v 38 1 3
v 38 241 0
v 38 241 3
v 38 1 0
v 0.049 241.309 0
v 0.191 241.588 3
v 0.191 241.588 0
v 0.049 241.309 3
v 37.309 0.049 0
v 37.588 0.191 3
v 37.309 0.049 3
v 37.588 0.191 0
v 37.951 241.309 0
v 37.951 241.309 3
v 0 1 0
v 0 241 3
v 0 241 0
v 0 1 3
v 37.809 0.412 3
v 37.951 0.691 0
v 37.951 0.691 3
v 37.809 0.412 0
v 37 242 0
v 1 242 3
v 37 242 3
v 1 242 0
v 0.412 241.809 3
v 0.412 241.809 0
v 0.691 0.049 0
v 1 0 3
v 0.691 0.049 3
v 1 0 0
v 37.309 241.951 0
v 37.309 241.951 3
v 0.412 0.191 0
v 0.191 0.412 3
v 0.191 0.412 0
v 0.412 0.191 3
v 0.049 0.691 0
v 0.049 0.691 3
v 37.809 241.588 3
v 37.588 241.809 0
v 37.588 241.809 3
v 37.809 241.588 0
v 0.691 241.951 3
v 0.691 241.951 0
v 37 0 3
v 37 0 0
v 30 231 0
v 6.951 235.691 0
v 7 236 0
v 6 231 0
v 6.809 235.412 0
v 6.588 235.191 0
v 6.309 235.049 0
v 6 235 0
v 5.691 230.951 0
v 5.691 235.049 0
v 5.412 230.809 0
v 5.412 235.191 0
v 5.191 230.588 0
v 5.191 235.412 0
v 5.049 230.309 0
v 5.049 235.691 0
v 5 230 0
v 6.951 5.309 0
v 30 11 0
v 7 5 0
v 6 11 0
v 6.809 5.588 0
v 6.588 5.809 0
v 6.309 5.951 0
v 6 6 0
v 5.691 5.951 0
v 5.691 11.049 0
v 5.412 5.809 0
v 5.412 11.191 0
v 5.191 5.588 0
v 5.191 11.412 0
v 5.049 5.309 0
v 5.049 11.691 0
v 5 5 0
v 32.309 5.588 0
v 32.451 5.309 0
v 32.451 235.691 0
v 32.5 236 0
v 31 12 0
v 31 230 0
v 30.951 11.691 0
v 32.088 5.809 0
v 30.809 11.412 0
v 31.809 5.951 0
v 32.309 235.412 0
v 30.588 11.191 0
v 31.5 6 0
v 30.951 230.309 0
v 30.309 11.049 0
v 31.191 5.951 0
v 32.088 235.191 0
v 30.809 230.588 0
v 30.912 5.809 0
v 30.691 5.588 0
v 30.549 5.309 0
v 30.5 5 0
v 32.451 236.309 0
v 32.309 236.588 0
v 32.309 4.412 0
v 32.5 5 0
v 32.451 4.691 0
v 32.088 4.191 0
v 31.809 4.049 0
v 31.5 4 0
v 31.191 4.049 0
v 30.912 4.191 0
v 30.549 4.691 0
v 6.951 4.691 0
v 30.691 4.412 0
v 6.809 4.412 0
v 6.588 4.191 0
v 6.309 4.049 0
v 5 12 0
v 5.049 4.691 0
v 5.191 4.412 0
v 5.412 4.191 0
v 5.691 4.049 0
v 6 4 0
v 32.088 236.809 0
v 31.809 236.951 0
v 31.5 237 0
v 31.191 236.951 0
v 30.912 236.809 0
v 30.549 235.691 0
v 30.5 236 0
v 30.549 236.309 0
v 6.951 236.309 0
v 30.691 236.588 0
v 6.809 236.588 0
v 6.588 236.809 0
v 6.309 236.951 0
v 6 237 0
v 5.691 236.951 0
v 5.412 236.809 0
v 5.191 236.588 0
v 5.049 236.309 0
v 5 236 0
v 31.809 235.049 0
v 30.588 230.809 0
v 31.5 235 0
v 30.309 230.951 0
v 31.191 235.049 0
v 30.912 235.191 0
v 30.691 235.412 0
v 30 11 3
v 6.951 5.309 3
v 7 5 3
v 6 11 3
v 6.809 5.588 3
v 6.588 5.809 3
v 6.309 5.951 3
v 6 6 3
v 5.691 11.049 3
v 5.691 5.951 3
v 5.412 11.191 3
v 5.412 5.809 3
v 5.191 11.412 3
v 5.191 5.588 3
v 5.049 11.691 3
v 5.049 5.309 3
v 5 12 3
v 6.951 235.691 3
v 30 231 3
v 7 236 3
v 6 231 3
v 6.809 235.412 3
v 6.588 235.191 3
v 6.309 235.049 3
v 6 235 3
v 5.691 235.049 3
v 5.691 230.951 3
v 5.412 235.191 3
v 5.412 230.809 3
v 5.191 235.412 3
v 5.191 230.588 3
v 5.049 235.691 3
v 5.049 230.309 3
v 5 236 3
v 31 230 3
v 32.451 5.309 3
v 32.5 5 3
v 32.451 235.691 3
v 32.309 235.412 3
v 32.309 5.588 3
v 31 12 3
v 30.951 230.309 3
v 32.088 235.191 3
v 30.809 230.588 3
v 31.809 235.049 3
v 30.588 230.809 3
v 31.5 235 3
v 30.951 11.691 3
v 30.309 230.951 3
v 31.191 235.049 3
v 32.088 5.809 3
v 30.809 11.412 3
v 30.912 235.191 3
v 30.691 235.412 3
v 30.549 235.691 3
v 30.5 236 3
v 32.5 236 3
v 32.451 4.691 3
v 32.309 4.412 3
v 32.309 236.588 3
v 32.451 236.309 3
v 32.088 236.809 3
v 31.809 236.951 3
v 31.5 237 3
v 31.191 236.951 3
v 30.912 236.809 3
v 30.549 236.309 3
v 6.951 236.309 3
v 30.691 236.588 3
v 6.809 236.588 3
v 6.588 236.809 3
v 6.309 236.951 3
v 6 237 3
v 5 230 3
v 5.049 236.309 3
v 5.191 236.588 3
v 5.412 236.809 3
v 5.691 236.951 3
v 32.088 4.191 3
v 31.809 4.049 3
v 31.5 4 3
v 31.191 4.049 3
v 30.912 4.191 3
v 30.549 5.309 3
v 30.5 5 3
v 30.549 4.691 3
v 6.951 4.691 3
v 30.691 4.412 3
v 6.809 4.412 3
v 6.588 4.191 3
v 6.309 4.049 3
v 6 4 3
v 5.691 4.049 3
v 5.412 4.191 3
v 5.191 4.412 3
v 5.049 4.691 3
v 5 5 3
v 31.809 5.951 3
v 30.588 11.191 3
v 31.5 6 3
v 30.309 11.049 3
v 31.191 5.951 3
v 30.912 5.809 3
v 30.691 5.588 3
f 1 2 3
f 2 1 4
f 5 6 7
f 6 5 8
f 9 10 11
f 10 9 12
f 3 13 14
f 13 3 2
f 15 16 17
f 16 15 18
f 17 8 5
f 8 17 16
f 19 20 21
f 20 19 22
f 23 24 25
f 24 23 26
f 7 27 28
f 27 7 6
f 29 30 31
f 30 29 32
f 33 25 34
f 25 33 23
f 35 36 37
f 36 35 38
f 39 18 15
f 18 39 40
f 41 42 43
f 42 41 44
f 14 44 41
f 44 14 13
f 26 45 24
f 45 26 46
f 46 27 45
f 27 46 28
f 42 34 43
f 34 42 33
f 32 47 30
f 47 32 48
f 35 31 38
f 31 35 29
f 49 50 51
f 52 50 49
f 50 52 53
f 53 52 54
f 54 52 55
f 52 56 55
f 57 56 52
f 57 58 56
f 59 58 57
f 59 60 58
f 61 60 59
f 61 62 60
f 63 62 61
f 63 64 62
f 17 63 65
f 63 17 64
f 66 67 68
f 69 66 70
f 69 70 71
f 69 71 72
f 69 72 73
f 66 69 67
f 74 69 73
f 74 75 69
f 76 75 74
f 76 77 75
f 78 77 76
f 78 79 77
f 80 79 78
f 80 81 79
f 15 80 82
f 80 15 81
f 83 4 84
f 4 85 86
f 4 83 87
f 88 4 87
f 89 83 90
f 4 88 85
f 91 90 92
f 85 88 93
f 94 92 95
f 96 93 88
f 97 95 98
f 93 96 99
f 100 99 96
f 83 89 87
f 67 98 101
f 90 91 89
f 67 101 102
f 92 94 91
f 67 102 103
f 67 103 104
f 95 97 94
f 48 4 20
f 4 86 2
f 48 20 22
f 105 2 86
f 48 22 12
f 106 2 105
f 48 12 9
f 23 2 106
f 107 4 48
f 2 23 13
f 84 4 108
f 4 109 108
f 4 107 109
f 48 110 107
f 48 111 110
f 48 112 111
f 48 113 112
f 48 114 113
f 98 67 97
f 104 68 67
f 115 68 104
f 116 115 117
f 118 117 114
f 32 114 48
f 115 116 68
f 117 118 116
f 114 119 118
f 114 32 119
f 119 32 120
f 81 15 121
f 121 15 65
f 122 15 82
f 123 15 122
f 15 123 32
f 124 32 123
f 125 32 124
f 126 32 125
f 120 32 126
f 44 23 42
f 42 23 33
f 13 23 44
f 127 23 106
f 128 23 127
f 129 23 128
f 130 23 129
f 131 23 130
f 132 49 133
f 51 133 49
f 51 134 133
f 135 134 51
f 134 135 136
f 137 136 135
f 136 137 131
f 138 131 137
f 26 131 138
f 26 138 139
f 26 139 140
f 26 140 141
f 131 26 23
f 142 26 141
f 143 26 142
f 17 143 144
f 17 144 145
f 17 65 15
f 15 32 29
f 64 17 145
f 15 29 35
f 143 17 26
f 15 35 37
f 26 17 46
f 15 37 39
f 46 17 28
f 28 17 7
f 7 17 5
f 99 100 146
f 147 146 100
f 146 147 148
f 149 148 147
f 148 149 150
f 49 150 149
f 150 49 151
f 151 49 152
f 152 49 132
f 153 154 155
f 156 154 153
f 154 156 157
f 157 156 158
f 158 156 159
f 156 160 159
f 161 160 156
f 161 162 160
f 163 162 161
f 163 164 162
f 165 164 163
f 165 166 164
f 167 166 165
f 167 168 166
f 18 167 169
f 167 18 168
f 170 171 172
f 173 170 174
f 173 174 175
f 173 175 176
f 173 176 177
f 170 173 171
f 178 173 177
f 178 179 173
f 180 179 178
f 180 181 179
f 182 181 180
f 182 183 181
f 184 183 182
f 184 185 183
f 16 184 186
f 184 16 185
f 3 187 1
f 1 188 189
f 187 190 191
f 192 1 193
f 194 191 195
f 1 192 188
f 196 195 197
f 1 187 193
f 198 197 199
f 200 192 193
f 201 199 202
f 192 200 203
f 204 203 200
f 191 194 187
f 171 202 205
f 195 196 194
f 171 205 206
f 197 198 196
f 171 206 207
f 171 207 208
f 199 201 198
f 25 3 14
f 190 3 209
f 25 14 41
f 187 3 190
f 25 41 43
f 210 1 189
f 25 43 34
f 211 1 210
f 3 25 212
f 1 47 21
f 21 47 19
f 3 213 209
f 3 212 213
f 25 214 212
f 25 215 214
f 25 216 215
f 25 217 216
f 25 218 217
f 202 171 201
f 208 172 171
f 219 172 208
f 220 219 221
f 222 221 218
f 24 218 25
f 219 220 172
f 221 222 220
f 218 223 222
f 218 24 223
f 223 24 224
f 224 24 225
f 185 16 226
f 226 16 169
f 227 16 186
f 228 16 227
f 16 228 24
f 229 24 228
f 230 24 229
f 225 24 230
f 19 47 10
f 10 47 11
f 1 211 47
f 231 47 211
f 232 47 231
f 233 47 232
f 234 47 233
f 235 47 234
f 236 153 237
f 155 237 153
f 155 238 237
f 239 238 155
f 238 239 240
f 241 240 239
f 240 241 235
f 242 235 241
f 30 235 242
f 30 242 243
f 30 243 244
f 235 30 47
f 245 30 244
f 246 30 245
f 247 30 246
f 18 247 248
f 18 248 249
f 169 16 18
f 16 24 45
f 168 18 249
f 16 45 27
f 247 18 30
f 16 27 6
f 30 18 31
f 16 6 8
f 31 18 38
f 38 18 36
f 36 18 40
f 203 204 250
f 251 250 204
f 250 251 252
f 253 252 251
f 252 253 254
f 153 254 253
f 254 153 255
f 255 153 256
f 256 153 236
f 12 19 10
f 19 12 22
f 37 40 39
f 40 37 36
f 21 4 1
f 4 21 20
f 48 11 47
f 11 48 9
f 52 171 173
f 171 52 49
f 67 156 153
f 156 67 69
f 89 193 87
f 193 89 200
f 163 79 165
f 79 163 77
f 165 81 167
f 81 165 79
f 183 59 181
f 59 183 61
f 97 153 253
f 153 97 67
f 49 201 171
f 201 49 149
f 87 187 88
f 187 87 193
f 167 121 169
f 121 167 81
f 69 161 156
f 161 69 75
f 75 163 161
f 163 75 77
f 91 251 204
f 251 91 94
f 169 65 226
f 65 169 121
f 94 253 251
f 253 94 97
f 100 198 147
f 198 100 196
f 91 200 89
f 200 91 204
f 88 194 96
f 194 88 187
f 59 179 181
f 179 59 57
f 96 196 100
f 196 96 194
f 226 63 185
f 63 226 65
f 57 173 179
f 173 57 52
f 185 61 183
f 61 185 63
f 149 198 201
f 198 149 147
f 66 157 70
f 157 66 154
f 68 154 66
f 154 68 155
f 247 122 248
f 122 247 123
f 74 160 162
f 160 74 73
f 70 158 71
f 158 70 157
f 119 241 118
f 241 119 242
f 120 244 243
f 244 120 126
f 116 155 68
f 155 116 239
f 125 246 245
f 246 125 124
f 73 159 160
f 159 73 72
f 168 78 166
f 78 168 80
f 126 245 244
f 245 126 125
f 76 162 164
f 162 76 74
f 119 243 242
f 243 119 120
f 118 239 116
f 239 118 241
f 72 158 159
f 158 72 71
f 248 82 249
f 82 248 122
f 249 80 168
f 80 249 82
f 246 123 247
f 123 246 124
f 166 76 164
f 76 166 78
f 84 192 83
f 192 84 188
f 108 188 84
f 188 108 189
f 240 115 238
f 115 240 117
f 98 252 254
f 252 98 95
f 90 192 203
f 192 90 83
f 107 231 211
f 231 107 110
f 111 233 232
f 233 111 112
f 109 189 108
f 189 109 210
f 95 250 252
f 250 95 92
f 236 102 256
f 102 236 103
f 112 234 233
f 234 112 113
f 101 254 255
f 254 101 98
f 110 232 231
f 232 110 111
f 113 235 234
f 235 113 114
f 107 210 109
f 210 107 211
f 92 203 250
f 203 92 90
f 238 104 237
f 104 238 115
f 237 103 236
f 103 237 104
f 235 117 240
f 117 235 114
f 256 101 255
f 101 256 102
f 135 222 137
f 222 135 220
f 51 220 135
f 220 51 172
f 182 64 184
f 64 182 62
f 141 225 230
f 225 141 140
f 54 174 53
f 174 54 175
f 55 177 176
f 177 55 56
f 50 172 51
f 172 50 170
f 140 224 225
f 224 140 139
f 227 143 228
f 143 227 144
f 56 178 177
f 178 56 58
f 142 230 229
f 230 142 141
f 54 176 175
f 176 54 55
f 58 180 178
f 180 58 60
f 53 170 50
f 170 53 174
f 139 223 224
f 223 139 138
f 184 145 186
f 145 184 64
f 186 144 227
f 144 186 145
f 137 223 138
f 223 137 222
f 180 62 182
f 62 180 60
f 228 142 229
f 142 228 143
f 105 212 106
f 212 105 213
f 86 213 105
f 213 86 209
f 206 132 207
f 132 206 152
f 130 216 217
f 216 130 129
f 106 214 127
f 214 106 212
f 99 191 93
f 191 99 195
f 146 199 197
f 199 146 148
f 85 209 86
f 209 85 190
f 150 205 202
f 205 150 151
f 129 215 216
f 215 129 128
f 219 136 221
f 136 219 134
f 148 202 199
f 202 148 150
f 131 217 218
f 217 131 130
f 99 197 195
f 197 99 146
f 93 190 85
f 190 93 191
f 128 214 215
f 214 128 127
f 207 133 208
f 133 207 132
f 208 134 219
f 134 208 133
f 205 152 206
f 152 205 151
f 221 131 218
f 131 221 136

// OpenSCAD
$fn = 20;
len = 242;
wid = 33;

spacing = 46.5;
boltDia = 3.2;

endcap(rad=1);

module endcap(rad=1) {
   difference() {
      union() {
         hull() {
            translate([1,1,0]) cylinder(r=1,h=3);
            translate([wid+5-1,1,0]) cylinder(r=1,h=3);
            translate([1,len-1,0]) cylinder(r=1,h=3);
            translate([wid+5-1,len-1,0]) cylinder(r=1,h=3);
         }
      }

      /* wire passthrough */
      hull() {
         translate([6,12,-1]) cylinder(r=1,h=12);
         translate([wid+5-1-7,12,-1]) cylinder(r=1,h=12);
         translate([6,len-12,-1]) cylinder(r=1,h=12);
         translate([wid+5-1-7,len-12,-1]) cylinder(r=1,h=12);
      }


      /* heat set inserts */
      translate([6,5,-1]) cylinder (r=rad, h=6.9);
      translate([31.5,5,-1]) cylinder (r=rad, h=6.9);

      translate([6,5+231,-1]) cylinder (r=rad, h=6.9);
      translate([31.5,5+231,-1]) cylinder (r=rad, h=6.9);
   }
}
